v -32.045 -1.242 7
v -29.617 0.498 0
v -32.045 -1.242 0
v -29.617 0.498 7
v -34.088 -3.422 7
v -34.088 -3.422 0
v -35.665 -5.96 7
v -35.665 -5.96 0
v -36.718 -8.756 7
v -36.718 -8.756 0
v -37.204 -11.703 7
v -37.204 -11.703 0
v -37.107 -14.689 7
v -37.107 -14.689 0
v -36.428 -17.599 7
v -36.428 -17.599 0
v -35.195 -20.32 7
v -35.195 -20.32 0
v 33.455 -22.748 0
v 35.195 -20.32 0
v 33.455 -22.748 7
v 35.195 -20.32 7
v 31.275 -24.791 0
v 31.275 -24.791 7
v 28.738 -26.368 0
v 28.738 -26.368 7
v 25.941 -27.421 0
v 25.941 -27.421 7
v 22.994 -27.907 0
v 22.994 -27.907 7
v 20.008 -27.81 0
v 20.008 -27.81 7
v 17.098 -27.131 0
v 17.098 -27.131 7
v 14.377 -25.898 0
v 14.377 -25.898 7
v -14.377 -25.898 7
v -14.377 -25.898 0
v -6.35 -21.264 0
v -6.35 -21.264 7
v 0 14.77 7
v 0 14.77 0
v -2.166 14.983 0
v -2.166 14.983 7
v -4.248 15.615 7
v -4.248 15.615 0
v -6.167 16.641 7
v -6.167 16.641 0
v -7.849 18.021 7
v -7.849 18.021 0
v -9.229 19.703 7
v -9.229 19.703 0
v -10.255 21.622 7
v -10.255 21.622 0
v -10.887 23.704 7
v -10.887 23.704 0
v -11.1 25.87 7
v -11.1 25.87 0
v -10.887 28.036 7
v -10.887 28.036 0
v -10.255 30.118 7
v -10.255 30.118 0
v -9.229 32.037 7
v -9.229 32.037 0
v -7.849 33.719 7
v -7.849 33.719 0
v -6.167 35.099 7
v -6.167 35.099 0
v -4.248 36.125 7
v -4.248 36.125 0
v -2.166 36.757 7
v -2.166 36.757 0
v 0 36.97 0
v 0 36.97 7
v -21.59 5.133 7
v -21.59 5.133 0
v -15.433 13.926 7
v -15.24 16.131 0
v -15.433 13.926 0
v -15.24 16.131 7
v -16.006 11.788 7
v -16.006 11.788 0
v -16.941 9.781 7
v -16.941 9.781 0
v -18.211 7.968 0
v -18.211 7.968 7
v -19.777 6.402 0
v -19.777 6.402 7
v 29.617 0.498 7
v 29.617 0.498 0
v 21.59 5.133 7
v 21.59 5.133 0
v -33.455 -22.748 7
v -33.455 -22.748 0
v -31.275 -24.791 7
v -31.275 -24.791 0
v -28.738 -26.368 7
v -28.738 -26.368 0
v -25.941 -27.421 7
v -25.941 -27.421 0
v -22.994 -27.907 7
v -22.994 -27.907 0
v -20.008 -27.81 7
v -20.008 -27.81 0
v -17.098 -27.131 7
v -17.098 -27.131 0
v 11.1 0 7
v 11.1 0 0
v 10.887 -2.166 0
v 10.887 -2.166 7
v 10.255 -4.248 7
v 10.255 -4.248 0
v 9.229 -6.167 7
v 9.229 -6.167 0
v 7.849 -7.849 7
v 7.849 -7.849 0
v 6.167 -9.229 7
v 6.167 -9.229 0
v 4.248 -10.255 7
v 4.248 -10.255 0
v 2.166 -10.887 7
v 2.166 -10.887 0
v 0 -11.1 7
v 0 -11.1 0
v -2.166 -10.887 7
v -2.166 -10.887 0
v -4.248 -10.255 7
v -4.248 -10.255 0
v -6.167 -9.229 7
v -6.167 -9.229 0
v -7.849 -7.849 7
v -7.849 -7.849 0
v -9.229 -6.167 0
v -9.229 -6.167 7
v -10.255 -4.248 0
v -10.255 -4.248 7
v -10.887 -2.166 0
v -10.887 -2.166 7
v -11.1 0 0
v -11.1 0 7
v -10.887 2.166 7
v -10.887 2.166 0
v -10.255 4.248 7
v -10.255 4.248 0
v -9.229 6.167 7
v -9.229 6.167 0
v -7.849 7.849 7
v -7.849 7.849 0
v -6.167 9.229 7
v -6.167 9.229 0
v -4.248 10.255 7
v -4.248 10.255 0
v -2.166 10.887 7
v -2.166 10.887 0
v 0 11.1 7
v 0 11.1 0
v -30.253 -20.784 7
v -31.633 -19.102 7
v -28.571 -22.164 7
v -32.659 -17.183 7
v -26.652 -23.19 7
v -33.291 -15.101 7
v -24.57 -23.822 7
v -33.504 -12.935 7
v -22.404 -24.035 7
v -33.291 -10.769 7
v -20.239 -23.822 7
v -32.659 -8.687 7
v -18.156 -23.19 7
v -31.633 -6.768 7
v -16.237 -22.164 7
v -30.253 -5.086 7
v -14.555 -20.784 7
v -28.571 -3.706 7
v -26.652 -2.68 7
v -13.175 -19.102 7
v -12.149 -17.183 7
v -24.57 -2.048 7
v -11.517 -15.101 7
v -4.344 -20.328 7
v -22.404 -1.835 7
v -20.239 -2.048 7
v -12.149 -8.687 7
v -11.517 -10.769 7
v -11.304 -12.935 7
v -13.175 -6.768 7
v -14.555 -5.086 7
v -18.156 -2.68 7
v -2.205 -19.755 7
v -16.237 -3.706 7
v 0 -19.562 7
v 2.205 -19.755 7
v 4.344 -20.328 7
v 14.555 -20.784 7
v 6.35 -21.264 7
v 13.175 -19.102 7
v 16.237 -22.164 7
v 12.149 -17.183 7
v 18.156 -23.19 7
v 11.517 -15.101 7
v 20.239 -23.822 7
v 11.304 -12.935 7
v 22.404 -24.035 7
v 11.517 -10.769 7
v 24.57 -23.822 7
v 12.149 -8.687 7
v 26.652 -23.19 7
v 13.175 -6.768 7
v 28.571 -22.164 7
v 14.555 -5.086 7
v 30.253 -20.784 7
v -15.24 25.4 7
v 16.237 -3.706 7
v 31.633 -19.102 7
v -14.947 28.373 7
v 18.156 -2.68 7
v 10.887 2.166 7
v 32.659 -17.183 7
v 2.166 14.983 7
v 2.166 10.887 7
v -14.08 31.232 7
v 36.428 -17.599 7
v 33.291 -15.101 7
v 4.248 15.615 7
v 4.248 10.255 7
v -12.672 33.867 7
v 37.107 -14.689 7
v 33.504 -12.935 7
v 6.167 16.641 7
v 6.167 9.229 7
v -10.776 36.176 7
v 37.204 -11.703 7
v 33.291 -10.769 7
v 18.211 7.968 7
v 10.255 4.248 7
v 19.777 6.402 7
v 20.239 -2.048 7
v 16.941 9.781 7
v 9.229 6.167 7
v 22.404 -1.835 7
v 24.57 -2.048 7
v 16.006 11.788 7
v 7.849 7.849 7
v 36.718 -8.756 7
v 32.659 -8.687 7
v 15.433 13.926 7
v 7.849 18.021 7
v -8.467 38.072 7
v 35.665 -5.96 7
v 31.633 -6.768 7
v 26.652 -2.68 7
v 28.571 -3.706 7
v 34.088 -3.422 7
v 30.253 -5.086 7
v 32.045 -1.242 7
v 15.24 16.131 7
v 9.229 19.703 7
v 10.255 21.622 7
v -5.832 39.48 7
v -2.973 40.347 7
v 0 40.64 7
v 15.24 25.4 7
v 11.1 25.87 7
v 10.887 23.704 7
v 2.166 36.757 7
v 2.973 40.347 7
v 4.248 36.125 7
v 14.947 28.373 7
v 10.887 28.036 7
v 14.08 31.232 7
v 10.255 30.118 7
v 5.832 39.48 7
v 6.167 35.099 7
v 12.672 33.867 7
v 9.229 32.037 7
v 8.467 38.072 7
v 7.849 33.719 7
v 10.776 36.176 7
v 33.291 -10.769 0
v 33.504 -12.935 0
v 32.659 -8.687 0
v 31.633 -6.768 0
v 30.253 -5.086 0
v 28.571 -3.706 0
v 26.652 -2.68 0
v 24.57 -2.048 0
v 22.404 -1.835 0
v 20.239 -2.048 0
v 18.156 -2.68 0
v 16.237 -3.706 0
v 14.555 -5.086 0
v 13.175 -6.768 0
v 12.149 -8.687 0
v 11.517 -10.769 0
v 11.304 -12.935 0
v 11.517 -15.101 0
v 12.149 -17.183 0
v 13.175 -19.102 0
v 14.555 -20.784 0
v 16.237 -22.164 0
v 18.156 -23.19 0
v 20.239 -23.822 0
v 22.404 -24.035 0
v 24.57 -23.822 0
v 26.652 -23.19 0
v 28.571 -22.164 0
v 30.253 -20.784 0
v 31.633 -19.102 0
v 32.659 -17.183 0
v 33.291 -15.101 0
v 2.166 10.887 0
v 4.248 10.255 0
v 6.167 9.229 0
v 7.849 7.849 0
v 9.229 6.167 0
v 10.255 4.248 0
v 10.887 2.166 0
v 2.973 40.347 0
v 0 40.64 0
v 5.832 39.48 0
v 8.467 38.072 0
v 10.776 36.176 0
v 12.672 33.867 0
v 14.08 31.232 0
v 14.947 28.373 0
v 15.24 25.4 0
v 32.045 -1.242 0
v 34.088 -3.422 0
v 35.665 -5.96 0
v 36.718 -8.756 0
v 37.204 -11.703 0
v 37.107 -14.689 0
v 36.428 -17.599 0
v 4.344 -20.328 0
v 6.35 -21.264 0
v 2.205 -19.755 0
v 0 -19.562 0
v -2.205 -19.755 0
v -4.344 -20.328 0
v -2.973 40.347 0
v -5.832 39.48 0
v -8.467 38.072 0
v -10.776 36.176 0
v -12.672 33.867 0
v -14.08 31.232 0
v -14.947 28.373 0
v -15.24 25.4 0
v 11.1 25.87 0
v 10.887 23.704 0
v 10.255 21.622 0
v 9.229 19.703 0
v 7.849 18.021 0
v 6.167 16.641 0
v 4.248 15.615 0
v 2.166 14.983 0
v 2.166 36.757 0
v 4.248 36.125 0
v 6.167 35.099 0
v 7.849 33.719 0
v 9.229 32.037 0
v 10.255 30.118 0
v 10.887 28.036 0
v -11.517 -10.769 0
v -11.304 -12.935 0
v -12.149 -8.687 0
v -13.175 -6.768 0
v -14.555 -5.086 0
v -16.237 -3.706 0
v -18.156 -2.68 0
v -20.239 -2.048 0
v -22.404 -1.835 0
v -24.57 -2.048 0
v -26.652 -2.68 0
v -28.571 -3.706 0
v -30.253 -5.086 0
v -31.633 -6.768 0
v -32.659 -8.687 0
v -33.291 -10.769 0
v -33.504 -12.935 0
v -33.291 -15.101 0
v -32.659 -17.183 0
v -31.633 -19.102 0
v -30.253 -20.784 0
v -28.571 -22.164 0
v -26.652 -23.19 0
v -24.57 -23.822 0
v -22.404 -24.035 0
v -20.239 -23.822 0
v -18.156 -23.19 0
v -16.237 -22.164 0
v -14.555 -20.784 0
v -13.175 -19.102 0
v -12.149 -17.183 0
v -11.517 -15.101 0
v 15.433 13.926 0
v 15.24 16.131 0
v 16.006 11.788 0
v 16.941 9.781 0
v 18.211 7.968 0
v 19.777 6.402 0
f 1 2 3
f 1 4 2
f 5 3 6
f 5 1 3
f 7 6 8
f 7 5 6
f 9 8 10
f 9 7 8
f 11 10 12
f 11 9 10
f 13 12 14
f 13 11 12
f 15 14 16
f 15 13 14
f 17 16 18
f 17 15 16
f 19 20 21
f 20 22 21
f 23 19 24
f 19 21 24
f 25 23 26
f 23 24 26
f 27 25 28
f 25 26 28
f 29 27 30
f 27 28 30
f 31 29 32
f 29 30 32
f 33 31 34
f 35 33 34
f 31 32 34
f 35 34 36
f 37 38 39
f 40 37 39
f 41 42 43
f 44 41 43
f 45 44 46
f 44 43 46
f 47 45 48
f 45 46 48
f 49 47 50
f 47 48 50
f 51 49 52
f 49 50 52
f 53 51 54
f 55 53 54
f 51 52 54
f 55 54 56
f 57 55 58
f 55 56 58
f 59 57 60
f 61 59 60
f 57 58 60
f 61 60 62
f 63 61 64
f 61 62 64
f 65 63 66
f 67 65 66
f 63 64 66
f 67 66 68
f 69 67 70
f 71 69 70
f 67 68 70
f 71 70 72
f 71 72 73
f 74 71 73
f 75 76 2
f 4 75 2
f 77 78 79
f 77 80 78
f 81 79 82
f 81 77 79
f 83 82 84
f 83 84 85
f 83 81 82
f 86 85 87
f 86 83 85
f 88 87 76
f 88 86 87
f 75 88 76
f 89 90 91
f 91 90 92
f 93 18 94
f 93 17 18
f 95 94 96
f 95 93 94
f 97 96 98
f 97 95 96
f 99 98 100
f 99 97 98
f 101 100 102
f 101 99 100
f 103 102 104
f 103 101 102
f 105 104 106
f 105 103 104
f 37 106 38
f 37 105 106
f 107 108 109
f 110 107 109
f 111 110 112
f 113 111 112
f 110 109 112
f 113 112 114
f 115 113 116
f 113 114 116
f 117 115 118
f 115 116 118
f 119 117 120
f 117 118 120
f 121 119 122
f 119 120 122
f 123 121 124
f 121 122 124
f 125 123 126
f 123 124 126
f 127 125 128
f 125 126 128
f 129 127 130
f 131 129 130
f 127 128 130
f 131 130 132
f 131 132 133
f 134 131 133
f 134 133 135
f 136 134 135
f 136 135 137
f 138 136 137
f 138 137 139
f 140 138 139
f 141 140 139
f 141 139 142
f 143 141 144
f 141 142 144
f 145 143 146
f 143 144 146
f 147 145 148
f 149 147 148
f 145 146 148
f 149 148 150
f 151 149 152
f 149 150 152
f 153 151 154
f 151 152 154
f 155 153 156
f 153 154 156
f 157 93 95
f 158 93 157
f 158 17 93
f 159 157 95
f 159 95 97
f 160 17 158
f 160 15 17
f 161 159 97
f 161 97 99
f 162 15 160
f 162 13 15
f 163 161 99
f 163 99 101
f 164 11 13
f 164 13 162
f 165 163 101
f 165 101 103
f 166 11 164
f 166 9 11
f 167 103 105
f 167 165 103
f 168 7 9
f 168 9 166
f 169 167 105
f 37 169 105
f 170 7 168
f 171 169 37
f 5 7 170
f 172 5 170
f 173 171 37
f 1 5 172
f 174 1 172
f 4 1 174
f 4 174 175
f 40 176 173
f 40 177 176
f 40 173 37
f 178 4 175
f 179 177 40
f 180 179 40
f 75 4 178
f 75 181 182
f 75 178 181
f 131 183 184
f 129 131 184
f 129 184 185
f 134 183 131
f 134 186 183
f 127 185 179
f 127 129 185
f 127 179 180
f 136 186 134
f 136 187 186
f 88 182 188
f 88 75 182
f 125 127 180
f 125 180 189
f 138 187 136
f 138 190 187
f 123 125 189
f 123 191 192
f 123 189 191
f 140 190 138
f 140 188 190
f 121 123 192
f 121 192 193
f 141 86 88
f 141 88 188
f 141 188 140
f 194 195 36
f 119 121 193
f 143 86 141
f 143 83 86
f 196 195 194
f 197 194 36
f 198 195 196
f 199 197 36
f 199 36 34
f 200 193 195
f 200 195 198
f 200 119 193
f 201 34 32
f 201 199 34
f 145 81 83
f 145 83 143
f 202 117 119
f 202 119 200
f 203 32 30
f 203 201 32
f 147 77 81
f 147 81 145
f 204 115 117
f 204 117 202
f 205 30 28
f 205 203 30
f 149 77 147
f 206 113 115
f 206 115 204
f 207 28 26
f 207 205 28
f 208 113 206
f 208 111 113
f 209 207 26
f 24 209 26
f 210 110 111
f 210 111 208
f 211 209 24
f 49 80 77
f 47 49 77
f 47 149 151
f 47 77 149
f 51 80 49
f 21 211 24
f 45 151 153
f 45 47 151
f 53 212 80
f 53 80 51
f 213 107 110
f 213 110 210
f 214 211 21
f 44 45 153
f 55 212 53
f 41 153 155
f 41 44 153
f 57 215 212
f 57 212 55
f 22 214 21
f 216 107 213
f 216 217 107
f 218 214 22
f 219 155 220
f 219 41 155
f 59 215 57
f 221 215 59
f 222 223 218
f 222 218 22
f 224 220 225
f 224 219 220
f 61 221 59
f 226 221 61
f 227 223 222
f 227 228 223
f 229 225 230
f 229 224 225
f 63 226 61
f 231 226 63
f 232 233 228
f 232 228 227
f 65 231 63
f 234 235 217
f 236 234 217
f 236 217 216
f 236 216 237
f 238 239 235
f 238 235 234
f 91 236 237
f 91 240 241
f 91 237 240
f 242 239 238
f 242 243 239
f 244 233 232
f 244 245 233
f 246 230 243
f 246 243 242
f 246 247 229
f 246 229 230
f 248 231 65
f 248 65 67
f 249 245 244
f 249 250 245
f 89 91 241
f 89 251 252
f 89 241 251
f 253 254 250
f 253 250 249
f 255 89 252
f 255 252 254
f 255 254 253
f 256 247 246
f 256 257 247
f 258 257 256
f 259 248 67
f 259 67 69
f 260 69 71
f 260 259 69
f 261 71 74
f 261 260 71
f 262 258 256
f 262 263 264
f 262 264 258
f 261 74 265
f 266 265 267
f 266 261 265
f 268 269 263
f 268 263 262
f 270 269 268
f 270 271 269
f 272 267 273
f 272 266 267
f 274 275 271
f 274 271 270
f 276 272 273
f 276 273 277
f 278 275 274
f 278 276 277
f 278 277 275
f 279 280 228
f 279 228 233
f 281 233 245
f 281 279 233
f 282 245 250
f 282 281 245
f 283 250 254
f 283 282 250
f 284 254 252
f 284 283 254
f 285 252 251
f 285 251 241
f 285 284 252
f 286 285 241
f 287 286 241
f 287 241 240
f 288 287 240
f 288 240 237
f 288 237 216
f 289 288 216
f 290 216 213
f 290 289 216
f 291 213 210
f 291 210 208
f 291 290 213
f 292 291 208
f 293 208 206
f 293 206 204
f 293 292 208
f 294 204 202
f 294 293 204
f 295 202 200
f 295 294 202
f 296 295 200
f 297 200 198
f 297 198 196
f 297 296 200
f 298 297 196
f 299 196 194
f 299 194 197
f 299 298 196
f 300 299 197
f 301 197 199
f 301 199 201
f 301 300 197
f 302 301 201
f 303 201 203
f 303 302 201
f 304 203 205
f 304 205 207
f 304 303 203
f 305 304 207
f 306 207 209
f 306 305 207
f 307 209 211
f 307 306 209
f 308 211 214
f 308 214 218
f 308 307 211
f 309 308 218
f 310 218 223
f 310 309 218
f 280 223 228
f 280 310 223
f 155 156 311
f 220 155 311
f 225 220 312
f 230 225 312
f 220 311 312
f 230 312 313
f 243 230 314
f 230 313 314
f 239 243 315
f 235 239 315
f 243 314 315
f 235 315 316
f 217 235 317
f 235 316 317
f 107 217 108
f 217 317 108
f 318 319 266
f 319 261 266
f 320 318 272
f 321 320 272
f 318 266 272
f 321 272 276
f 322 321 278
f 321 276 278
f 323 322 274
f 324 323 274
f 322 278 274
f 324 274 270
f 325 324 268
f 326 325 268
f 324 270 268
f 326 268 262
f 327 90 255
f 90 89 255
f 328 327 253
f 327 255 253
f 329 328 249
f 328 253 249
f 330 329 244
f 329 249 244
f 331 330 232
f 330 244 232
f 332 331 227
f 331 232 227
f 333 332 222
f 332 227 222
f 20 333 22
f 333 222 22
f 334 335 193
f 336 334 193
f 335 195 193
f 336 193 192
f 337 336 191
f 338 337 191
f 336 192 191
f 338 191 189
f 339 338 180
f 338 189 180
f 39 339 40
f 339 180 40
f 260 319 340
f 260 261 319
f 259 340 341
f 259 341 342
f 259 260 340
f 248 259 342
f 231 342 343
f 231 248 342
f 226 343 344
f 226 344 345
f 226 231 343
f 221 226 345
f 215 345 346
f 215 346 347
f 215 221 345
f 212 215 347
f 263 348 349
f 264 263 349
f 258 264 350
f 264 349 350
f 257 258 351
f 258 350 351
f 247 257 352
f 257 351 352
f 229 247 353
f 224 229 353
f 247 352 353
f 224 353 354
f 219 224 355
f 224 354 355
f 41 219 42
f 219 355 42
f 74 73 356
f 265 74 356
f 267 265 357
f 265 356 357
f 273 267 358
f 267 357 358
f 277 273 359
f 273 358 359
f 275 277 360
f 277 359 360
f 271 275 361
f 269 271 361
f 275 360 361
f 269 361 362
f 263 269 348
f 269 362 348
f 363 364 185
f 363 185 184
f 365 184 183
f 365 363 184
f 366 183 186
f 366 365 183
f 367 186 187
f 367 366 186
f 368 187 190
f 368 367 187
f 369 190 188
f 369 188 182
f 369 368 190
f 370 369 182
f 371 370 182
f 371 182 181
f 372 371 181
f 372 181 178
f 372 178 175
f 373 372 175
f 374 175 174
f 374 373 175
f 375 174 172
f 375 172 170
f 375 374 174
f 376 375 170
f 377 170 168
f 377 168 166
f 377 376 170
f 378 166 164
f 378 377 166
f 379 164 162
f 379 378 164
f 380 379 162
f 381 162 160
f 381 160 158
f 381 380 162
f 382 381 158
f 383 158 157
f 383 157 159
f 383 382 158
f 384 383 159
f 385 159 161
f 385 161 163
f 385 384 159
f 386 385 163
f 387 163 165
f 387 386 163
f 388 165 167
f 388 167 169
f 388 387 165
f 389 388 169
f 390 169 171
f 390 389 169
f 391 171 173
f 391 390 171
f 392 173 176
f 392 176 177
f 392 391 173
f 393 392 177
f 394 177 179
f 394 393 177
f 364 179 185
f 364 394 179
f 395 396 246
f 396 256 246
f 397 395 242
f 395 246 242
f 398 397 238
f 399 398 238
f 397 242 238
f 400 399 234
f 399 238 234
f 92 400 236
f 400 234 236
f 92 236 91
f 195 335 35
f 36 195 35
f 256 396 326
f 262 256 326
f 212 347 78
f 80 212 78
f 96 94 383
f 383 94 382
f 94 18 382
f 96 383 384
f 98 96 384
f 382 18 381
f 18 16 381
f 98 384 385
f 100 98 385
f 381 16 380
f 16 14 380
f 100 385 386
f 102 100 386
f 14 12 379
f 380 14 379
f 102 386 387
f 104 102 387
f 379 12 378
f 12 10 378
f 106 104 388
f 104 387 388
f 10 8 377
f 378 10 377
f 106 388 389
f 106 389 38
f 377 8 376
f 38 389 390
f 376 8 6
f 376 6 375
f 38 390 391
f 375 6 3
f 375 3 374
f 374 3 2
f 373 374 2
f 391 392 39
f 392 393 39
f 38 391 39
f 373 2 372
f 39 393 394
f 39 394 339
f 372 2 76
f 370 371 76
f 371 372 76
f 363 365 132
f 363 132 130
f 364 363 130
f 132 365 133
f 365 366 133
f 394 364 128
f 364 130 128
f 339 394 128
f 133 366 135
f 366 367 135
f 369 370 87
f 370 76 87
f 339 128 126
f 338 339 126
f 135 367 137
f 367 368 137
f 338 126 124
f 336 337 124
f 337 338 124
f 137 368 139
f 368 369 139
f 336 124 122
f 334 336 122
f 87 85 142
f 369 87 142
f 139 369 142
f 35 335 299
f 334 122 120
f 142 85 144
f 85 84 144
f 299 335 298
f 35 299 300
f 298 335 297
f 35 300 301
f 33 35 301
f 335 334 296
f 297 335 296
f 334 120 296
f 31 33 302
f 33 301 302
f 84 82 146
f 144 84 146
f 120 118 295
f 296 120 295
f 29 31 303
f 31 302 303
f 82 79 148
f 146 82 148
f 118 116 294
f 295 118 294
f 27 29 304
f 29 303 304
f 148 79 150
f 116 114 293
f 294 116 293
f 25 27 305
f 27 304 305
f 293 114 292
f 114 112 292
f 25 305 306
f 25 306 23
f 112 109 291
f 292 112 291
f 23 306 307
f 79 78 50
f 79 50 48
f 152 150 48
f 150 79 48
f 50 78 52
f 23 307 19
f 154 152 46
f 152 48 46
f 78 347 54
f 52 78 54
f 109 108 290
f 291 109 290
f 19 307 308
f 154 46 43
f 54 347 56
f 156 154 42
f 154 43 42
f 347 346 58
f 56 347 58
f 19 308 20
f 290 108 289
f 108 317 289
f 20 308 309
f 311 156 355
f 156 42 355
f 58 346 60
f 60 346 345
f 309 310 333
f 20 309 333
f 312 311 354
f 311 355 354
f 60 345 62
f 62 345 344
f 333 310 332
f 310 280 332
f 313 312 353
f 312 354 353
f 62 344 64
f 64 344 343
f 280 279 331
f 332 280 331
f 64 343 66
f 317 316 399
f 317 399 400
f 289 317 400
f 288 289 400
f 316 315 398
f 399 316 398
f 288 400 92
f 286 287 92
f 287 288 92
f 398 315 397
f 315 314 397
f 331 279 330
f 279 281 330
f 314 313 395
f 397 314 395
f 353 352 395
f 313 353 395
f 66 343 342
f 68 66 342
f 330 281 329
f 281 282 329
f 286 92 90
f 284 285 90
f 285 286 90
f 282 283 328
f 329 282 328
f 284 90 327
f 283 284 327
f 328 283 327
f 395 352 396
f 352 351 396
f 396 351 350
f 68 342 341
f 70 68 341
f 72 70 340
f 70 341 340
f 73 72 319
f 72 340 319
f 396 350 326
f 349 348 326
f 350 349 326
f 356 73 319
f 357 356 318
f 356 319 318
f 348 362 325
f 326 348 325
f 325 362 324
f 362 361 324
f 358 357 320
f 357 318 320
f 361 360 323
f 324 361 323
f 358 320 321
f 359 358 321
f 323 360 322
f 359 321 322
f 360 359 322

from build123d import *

# Parameters (mm, degrees)
F0_R     = 11.1
F1_DEPTH = 7
F2_R     = 15.23999
F3_R     = 12.7


# Not quite as in the source:
# - a fillet or chamfer is up to 0.001 mm smaller than in the source, because OpenCascade refuses the exact size


with BuildPart() as f1:
    # F0 (on Top) → F1 (new body)
    with BuildSketch(Plane.XY):
        Polygon((15.24, 40.64), (0, 40.64), (-15.24, 40.64), (-15.24, 8.7988181024), (-42.8152724098, -7.1217728463), (-27.5752724098, -33.5182271537), (0, -17.5976362049), (27.5752724098, -33.5182271537), (42.8152724098, -7.1217728463), (15.24, 8.7988181024), align=None)
        with Locations((-22.4040771959, -12.935)):
            Circle(F0_R, mode=Mode.SUBTRACT)
        with BuildLine():
            ThreePointArc((0, 11.1), (7.8488852712, 7.8488852712), (11.1, 0))
            ThreePointArc((11.1, 0), (-7.8488852712, -7.8488852712), (0, 11.1))
        make_face(mode=Mode.SUBTRACT)
        with Locations((22.4040771959, -12.935)):
            Circle(F0_R, mode=Mode.SUBTRACT)
        with BuildLine():
            ThreePointArc((11.1, 25.87), (7.8488852712, 18.0211147288), (0, 14.77))
            ThreePointArc((0, 14.77), (-11.1, 25.87), (0, 36.97))
            ThreePointArc((0, 36.97), (7.8488852712, 33.7188852712), (11.1, 25.87))
        make_face(mode=Mode.SUBTRACT)
    extrude(amount=F1_DEPTH)

    # F2 (radius 15.24 in the source; OpenCascade refuses exactly that, so slightly less here)
    f2_edges = [f1.edges().sort_by_distance(p)[0] for p in [
        (15.24, 40.64, 3.5),
        (-15.24, 40.64, 3.5),
        (-42.815272, -7.121773, 3.5),
        (-27.575272, -33.518227, 3.5),
        (42.815272, -7.121773, 3.5),
        (27.575272, -33.518227, 3.5),
    ]]
    fillet(f2_edges, radius=F2_R)

    # F3
    f3_edges = [f1.edges().sort_by_distance(p)[0] for p in [
        (15.24, 8.798818, 3.5),
        (0, -17.597636, 3.5),
        (-15.24, 8.798818, 3.5),
    ]]
    fillet(f3_edges, radius=F3_R)


solid = f1.part
